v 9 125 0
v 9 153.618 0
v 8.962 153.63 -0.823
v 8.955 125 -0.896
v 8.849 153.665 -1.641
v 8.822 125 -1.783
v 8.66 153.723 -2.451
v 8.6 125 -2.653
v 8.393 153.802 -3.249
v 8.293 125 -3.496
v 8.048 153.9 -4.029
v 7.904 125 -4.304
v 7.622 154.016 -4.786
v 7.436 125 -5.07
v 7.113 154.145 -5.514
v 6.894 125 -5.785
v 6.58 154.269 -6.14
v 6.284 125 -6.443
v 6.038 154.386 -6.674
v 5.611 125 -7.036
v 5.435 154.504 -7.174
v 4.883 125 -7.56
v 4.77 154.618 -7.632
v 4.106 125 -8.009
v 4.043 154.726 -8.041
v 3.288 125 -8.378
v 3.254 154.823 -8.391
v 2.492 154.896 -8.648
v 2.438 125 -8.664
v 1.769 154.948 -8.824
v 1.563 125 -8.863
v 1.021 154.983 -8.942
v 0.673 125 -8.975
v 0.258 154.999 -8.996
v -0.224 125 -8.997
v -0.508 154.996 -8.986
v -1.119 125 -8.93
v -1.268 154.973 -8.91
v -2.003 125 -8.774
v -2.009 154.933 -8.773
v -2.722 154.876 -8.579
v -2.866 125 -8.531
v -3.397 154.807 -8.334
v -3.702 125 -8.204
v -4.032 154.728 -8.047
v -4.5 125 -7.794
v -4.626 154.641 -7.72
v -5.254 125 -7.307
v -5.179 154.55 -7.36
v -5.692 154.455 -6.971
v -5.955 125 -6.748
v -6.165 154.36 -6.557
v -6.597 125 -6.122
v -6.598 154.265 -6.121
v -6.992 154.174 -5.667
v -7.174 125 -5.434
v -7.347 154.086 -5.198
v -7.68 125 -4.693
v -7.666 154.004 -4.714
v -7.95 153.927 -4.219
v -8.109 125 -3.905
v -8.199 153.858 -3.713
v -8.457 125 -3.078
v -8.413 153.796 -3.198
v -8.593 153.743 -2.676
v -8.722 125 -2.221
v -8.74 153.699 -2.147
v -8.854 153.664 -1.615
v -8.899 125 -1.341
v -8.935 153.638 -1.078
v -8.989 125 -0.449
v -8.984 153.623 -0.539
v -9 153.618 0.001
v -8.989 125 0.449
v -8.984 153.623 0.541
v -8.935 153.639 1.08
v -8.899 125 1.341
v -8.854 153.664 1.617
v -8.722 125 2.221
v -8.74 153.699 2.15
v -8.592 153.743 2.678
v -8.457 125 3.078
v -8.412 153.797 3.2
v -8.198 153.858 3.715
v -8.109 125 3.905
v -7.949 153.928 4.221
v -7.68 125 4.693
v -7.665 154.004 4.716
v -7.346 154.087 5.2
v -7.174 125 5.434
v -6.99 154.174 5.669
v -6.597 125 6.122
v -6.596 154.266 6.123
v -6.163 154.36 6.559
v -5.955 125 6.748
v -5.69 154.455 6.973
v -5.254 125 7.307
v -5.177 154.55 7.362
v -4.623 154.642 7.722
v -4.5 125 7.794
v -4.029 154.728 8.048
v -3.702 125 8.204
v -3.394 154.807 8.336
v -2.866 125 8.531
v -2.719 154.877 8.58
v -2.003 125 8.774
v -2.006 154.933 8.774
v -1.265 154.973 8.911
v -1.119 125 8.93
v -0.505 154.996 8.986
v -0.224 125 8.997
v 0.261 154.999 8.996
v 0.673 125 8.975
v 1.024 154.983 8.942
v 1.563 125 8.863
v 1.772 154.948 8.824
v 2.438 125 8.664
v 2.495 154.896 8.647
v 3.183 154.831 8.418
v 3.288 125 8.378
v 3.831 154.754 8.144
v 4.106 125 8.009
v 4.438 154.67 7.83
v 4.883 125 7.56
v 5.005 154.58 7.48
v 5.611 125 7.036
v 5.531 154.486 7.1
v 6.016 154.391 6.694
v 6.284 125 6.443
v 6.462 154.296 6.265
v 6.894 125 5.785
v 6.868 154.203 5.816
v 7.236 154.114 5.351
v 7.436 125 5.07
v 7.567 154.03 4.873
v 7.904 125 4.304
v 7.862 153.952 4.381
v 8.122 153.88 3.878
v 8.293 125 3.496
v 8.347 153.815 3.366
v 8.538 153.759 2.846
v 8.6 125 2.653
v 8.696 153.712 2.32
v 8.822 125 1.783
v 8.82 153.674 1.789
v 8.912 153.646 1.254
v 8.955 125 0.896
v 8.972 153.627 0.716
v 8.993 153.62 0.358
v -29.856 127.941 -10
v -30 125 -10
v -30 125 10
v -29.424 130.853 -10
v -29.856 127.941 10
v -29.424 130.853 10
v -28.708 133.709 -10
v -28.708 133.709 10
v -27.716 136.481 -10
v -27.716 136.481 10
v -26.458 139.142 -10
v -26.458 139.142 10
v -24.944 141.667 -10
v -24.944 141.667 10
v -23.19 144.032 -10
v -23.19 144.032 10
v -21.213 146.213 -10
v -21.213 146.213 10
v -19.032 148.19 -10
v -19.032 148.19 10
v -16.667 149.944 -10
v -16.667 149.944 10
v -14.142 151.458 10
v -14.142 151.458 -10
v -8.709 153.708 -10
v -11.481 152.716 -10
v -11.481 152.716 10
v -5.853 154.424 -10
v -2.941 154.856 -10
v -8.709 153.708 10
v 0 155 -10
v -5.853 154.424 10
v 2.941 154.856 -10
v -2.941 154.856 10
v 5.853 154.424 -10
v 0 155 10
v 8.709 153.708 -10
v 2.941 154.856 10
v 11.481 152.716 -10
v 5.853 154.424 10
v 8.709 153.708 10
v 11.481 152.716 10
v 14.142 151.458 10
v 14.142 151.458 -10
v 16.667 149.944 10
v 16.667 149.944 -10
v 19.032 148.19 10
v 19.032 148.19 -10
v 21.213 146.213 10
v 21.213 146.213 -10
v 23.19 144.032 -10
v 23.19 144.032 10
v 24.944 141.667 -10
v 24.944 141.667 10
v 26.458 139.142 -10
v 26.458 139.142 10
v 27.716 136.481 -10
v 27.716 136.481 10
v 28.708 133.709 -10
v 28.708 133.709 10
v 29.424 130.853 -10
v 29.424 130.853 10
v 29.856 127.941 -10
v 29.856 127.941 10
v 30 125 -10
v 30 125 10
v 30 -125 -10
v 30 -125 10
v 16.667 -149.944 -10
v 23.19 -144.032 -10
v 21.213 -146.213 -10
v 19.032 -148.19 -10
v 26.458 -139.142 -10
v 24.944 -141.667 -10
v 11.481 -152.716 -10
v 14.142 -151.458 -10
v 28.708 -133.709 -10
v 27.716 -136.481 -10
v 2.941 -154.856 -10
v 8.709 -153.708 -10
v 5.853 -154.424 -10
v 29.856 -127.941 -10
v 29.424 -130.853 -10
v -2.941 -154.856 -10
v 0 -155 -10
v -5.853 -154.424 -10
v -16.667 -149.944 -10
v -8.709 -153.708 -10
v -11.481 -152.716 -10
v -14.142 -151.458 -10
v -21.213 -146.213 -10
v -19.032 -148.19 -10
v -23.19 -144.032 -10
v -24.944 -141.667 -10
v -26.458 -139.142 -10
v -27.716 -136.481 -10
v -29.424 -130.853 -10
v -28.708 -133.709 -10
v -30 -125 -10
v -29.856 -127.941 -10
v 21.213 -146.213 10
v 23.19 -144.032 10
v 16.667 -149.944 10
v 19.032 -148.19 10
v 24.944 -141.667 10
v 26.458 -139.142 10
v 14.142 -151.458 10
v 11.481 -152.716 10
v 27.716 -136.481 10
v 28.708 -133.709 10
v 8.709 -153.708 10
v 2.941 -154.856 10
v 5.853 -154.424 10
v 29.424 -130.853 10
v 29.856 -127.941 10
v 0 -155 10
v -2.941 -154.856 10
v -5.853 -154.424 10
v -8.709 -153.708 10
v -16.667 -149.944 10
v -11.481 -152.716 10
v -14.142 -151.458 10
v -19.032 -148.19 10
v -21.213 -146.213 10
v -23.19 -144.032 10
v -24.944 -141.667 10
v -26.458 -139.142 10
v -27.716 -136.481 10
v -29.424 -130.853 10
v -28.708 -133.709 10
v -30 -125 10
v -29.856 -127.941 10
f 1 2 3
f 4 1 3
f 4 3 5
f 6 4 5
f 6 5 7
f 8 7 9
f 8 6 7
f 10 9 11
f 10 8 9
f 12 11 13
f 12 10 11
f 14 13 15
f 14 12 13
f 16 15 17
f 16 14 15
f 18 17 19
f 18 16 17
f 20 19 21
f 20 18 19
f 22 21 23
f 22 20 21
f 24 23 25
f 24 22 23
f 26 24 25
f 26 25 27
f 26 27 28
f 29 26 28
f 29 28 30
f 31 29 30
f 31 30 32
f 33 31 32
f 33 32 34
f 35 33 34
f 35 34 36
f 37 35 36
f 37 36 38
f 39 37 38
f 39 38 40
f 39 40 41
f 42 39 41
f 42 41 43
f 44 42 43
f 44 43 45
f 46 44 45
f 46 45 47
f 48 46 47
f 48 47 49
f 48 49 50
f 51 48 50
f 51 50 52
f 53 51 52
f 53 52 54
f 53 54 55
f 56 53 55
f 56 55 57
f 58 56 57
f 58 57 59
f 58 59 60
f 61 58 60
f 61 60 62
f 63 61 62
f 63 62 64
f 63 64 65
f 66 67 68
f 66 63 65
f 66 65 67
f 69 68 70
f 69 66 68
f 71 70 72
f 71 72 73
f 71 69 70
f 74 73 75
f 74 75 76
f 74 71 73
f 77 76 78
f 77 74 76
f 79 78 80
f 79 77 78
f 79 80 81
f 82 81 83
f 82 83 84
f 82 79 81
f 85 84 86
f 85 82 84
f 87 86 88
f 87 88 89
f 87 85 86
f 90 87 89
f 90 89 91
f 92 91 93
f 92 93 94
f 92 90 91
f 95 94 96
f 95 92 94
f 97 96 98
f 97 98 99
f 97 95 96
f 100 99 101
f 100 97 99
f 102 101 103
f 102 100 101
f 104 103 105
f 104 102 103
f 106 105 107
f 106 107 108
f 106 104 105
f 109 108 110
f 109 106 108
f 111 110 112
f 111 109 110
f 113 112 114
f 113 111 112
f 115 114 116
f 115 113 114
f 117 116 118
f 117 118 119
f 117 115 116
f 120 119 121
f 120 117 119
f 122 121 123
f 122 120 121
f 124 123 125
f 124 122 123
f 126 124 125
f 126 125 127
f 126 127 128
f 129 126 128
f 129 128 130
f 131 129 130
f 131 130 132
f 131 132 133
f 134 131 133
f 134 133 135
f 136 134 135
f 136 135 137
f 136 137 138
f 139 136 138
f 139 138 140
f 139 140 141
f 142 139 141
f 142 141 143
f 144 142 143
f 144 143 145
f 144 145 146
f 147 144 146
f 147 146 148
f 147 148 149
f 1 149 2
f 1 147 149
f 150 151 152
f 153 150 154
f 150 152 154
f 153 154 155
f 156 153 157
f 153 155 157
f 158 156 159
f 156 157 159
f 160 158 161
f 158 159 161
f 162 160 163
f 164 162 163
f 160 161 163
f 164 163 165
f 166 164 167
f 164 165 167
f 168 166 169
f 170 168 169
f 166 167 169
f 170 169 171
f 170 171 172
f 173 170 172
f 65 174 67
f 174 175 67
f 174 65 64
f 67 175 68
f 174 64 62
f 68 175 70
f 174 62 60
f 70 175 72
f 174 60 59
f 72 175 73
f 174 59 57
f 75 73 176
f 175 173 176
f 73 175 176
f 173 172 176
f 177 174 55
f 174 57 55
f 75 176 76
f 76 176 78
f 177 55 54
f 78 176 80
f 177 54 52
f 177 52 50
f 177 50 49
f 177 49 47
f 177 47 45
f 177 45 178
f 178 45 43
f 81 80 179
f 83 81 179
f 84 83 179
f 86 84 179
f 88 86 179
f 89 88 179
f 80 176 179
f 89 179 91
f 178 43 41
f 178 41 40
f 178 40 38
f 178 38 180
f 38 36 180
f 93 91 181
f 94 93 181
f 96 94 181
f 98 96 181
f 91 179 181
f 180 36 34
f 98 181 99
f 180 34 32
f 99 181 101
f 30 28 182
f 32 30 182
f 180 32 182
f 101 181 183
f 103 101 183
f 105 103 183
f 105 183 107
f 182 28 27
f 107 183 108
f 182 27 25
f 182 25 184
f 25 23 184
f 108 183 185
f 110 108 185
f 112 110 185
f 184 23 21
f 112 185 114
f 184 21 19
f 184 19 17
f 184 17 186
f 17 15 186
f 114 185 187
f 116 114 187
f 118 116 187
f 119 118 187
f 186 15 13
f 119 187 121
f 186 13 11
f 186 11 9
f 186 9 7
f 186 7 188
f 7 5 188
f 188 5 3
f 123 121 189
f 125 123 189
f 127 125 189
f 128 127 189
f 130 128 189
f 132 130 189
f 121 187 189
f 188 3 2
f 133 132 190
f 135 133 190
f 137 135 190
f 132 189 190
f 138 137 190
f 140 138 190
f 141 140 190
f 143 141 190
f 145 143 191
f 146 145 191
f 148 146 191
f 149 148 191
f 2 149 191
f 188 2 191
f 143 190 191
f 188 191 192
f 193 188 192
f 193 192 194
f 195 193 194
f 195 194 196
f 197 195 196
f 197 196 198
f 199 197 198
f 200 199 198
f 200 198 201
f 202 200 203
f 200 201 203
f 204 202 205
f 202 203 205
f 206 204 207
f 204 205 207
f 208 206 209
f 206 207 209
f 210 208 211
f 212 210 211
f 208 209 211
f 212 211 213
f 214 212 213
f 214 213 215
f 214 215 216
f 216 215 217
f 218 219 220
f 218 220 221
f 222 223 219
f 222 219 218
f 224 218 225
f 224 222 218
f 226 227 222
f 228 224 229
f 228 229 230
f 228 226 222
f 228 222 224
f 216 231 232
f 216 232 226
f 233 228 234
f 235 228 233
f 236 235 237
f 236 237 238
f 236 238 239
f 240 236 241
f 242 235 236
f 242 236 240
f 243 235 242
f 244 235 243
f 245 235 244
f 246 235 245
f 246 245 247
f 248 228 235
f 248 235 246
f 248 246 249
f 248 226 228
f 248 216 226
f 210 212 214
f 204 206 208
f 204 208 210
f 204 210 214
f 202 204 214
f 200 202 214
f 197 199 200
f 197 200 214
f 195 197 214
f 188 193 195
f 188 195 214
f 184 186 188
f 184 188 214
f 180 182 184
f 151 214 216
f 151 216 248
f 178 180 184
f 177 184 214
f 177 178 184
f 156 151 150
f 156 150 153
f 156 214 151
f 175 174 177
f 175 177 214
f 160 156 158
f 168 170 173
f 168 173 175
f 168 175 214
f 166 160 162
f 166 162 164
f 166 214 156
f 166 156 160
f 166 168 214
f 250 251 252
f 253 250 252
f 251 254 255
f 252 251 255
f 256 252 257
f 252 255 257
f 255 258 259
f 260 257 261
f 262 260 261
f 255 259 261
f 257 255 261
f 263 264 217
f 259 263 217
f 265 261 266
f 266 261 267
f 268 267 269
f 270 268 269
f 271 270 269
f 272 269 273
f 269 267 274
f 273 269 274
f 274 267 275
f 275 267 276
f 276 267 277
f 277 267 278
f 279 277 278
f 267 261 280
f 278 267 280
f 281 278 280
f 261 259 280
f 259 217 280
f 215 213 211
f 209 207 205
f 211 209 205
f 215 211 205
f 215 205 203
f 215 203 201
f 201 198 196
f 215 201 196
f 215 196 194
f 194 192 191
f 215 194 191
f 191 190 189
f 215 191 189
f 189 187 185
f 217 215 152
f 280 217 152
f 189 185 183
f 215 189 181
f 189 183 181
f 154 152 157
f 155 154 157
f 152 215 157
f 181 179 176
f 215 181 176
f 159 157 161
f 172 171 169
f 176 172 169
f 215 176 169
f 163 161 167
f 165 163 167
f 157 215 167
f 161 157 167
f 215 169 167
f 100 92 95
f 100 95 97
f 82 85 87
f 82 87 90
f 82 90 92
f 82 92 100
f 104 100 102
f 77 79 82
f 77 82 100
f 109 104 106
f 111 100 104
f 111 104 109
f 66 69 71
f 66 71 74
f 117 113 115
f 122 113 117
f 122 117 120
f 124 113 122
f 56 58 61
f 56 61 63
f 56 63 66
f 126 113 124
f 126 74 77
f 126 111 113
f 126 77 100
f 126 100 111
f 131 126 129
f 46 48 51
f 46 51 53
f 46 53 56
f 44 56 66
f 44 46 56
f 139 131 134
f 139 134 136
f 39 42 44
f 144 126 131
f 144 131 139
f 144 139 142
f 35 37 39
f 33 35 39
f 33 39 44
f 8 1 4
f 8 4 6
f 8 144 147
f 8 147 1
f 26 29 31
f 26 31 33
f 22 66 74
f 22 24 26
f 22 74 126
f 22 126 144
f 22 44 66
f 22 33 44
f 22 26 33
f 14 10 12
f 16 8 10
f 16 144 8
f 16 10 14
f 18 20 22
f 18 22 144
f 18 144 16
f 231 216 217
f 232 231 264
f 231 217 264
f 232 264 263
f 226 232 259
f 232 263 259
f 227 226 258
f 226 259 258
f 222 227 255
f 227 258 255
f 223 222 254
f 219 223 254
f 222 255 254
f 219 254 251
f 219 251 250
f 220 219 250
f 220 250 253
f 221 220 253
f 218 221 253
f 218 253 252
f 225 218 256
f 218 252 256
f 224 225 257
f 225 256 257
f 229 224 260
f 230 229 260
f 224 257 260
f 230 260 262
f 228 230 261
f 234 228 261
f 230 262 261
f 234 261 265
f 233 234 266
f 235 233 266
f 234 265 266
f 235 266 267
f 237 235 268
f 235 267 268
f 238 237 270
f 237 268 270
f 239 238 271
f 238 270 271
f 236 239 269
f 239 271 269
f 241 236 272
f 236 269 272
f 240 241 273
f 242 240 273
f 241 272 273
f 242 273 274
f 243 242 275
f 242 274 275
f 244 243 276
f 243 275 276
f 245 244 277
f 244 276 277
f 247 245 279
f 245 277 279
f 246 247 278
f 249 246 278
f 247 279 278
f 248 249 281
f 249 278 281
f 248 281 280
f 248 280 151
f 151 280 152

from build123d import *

# Parameters (mm, degrees)
BOSS_EXTRUDE1_DEPTH = 10
SKETCH5_R           = 9
CUT_EXTRUDE1_DEPTH  = 40


with BuildPart() as part:
    # Sketch3 → Boss-Extrude1 (new body, symmetric)
    with BuildSketch(Plane.XY):
        with BuildLine():
            Line((-30, -125), (-30, 125))
            ThreePointArc((-30, 125), (0, 155), (30, 125))
            Line((30, 125), (30, -125))
            ThreePointArc((30, -125), (0, -155), (-30, -125))
        make_face()
    extrude(amount=BOSS_EXTRUDE1_DEPTH, both=True)

    # Sketch5 → Cut-Extrude1 (cut)
    with BuildSketch(Plane(origin=(0, 125, 0), x_dir=(1, 0, 0), z_dir=(0, 1, 0))):
        Circle(SKETCH5_R)
    extrude(amount=CUT_EXTRUDE1_DEPTH, mode=Mode.SUBTRACT)


solid = part.part
